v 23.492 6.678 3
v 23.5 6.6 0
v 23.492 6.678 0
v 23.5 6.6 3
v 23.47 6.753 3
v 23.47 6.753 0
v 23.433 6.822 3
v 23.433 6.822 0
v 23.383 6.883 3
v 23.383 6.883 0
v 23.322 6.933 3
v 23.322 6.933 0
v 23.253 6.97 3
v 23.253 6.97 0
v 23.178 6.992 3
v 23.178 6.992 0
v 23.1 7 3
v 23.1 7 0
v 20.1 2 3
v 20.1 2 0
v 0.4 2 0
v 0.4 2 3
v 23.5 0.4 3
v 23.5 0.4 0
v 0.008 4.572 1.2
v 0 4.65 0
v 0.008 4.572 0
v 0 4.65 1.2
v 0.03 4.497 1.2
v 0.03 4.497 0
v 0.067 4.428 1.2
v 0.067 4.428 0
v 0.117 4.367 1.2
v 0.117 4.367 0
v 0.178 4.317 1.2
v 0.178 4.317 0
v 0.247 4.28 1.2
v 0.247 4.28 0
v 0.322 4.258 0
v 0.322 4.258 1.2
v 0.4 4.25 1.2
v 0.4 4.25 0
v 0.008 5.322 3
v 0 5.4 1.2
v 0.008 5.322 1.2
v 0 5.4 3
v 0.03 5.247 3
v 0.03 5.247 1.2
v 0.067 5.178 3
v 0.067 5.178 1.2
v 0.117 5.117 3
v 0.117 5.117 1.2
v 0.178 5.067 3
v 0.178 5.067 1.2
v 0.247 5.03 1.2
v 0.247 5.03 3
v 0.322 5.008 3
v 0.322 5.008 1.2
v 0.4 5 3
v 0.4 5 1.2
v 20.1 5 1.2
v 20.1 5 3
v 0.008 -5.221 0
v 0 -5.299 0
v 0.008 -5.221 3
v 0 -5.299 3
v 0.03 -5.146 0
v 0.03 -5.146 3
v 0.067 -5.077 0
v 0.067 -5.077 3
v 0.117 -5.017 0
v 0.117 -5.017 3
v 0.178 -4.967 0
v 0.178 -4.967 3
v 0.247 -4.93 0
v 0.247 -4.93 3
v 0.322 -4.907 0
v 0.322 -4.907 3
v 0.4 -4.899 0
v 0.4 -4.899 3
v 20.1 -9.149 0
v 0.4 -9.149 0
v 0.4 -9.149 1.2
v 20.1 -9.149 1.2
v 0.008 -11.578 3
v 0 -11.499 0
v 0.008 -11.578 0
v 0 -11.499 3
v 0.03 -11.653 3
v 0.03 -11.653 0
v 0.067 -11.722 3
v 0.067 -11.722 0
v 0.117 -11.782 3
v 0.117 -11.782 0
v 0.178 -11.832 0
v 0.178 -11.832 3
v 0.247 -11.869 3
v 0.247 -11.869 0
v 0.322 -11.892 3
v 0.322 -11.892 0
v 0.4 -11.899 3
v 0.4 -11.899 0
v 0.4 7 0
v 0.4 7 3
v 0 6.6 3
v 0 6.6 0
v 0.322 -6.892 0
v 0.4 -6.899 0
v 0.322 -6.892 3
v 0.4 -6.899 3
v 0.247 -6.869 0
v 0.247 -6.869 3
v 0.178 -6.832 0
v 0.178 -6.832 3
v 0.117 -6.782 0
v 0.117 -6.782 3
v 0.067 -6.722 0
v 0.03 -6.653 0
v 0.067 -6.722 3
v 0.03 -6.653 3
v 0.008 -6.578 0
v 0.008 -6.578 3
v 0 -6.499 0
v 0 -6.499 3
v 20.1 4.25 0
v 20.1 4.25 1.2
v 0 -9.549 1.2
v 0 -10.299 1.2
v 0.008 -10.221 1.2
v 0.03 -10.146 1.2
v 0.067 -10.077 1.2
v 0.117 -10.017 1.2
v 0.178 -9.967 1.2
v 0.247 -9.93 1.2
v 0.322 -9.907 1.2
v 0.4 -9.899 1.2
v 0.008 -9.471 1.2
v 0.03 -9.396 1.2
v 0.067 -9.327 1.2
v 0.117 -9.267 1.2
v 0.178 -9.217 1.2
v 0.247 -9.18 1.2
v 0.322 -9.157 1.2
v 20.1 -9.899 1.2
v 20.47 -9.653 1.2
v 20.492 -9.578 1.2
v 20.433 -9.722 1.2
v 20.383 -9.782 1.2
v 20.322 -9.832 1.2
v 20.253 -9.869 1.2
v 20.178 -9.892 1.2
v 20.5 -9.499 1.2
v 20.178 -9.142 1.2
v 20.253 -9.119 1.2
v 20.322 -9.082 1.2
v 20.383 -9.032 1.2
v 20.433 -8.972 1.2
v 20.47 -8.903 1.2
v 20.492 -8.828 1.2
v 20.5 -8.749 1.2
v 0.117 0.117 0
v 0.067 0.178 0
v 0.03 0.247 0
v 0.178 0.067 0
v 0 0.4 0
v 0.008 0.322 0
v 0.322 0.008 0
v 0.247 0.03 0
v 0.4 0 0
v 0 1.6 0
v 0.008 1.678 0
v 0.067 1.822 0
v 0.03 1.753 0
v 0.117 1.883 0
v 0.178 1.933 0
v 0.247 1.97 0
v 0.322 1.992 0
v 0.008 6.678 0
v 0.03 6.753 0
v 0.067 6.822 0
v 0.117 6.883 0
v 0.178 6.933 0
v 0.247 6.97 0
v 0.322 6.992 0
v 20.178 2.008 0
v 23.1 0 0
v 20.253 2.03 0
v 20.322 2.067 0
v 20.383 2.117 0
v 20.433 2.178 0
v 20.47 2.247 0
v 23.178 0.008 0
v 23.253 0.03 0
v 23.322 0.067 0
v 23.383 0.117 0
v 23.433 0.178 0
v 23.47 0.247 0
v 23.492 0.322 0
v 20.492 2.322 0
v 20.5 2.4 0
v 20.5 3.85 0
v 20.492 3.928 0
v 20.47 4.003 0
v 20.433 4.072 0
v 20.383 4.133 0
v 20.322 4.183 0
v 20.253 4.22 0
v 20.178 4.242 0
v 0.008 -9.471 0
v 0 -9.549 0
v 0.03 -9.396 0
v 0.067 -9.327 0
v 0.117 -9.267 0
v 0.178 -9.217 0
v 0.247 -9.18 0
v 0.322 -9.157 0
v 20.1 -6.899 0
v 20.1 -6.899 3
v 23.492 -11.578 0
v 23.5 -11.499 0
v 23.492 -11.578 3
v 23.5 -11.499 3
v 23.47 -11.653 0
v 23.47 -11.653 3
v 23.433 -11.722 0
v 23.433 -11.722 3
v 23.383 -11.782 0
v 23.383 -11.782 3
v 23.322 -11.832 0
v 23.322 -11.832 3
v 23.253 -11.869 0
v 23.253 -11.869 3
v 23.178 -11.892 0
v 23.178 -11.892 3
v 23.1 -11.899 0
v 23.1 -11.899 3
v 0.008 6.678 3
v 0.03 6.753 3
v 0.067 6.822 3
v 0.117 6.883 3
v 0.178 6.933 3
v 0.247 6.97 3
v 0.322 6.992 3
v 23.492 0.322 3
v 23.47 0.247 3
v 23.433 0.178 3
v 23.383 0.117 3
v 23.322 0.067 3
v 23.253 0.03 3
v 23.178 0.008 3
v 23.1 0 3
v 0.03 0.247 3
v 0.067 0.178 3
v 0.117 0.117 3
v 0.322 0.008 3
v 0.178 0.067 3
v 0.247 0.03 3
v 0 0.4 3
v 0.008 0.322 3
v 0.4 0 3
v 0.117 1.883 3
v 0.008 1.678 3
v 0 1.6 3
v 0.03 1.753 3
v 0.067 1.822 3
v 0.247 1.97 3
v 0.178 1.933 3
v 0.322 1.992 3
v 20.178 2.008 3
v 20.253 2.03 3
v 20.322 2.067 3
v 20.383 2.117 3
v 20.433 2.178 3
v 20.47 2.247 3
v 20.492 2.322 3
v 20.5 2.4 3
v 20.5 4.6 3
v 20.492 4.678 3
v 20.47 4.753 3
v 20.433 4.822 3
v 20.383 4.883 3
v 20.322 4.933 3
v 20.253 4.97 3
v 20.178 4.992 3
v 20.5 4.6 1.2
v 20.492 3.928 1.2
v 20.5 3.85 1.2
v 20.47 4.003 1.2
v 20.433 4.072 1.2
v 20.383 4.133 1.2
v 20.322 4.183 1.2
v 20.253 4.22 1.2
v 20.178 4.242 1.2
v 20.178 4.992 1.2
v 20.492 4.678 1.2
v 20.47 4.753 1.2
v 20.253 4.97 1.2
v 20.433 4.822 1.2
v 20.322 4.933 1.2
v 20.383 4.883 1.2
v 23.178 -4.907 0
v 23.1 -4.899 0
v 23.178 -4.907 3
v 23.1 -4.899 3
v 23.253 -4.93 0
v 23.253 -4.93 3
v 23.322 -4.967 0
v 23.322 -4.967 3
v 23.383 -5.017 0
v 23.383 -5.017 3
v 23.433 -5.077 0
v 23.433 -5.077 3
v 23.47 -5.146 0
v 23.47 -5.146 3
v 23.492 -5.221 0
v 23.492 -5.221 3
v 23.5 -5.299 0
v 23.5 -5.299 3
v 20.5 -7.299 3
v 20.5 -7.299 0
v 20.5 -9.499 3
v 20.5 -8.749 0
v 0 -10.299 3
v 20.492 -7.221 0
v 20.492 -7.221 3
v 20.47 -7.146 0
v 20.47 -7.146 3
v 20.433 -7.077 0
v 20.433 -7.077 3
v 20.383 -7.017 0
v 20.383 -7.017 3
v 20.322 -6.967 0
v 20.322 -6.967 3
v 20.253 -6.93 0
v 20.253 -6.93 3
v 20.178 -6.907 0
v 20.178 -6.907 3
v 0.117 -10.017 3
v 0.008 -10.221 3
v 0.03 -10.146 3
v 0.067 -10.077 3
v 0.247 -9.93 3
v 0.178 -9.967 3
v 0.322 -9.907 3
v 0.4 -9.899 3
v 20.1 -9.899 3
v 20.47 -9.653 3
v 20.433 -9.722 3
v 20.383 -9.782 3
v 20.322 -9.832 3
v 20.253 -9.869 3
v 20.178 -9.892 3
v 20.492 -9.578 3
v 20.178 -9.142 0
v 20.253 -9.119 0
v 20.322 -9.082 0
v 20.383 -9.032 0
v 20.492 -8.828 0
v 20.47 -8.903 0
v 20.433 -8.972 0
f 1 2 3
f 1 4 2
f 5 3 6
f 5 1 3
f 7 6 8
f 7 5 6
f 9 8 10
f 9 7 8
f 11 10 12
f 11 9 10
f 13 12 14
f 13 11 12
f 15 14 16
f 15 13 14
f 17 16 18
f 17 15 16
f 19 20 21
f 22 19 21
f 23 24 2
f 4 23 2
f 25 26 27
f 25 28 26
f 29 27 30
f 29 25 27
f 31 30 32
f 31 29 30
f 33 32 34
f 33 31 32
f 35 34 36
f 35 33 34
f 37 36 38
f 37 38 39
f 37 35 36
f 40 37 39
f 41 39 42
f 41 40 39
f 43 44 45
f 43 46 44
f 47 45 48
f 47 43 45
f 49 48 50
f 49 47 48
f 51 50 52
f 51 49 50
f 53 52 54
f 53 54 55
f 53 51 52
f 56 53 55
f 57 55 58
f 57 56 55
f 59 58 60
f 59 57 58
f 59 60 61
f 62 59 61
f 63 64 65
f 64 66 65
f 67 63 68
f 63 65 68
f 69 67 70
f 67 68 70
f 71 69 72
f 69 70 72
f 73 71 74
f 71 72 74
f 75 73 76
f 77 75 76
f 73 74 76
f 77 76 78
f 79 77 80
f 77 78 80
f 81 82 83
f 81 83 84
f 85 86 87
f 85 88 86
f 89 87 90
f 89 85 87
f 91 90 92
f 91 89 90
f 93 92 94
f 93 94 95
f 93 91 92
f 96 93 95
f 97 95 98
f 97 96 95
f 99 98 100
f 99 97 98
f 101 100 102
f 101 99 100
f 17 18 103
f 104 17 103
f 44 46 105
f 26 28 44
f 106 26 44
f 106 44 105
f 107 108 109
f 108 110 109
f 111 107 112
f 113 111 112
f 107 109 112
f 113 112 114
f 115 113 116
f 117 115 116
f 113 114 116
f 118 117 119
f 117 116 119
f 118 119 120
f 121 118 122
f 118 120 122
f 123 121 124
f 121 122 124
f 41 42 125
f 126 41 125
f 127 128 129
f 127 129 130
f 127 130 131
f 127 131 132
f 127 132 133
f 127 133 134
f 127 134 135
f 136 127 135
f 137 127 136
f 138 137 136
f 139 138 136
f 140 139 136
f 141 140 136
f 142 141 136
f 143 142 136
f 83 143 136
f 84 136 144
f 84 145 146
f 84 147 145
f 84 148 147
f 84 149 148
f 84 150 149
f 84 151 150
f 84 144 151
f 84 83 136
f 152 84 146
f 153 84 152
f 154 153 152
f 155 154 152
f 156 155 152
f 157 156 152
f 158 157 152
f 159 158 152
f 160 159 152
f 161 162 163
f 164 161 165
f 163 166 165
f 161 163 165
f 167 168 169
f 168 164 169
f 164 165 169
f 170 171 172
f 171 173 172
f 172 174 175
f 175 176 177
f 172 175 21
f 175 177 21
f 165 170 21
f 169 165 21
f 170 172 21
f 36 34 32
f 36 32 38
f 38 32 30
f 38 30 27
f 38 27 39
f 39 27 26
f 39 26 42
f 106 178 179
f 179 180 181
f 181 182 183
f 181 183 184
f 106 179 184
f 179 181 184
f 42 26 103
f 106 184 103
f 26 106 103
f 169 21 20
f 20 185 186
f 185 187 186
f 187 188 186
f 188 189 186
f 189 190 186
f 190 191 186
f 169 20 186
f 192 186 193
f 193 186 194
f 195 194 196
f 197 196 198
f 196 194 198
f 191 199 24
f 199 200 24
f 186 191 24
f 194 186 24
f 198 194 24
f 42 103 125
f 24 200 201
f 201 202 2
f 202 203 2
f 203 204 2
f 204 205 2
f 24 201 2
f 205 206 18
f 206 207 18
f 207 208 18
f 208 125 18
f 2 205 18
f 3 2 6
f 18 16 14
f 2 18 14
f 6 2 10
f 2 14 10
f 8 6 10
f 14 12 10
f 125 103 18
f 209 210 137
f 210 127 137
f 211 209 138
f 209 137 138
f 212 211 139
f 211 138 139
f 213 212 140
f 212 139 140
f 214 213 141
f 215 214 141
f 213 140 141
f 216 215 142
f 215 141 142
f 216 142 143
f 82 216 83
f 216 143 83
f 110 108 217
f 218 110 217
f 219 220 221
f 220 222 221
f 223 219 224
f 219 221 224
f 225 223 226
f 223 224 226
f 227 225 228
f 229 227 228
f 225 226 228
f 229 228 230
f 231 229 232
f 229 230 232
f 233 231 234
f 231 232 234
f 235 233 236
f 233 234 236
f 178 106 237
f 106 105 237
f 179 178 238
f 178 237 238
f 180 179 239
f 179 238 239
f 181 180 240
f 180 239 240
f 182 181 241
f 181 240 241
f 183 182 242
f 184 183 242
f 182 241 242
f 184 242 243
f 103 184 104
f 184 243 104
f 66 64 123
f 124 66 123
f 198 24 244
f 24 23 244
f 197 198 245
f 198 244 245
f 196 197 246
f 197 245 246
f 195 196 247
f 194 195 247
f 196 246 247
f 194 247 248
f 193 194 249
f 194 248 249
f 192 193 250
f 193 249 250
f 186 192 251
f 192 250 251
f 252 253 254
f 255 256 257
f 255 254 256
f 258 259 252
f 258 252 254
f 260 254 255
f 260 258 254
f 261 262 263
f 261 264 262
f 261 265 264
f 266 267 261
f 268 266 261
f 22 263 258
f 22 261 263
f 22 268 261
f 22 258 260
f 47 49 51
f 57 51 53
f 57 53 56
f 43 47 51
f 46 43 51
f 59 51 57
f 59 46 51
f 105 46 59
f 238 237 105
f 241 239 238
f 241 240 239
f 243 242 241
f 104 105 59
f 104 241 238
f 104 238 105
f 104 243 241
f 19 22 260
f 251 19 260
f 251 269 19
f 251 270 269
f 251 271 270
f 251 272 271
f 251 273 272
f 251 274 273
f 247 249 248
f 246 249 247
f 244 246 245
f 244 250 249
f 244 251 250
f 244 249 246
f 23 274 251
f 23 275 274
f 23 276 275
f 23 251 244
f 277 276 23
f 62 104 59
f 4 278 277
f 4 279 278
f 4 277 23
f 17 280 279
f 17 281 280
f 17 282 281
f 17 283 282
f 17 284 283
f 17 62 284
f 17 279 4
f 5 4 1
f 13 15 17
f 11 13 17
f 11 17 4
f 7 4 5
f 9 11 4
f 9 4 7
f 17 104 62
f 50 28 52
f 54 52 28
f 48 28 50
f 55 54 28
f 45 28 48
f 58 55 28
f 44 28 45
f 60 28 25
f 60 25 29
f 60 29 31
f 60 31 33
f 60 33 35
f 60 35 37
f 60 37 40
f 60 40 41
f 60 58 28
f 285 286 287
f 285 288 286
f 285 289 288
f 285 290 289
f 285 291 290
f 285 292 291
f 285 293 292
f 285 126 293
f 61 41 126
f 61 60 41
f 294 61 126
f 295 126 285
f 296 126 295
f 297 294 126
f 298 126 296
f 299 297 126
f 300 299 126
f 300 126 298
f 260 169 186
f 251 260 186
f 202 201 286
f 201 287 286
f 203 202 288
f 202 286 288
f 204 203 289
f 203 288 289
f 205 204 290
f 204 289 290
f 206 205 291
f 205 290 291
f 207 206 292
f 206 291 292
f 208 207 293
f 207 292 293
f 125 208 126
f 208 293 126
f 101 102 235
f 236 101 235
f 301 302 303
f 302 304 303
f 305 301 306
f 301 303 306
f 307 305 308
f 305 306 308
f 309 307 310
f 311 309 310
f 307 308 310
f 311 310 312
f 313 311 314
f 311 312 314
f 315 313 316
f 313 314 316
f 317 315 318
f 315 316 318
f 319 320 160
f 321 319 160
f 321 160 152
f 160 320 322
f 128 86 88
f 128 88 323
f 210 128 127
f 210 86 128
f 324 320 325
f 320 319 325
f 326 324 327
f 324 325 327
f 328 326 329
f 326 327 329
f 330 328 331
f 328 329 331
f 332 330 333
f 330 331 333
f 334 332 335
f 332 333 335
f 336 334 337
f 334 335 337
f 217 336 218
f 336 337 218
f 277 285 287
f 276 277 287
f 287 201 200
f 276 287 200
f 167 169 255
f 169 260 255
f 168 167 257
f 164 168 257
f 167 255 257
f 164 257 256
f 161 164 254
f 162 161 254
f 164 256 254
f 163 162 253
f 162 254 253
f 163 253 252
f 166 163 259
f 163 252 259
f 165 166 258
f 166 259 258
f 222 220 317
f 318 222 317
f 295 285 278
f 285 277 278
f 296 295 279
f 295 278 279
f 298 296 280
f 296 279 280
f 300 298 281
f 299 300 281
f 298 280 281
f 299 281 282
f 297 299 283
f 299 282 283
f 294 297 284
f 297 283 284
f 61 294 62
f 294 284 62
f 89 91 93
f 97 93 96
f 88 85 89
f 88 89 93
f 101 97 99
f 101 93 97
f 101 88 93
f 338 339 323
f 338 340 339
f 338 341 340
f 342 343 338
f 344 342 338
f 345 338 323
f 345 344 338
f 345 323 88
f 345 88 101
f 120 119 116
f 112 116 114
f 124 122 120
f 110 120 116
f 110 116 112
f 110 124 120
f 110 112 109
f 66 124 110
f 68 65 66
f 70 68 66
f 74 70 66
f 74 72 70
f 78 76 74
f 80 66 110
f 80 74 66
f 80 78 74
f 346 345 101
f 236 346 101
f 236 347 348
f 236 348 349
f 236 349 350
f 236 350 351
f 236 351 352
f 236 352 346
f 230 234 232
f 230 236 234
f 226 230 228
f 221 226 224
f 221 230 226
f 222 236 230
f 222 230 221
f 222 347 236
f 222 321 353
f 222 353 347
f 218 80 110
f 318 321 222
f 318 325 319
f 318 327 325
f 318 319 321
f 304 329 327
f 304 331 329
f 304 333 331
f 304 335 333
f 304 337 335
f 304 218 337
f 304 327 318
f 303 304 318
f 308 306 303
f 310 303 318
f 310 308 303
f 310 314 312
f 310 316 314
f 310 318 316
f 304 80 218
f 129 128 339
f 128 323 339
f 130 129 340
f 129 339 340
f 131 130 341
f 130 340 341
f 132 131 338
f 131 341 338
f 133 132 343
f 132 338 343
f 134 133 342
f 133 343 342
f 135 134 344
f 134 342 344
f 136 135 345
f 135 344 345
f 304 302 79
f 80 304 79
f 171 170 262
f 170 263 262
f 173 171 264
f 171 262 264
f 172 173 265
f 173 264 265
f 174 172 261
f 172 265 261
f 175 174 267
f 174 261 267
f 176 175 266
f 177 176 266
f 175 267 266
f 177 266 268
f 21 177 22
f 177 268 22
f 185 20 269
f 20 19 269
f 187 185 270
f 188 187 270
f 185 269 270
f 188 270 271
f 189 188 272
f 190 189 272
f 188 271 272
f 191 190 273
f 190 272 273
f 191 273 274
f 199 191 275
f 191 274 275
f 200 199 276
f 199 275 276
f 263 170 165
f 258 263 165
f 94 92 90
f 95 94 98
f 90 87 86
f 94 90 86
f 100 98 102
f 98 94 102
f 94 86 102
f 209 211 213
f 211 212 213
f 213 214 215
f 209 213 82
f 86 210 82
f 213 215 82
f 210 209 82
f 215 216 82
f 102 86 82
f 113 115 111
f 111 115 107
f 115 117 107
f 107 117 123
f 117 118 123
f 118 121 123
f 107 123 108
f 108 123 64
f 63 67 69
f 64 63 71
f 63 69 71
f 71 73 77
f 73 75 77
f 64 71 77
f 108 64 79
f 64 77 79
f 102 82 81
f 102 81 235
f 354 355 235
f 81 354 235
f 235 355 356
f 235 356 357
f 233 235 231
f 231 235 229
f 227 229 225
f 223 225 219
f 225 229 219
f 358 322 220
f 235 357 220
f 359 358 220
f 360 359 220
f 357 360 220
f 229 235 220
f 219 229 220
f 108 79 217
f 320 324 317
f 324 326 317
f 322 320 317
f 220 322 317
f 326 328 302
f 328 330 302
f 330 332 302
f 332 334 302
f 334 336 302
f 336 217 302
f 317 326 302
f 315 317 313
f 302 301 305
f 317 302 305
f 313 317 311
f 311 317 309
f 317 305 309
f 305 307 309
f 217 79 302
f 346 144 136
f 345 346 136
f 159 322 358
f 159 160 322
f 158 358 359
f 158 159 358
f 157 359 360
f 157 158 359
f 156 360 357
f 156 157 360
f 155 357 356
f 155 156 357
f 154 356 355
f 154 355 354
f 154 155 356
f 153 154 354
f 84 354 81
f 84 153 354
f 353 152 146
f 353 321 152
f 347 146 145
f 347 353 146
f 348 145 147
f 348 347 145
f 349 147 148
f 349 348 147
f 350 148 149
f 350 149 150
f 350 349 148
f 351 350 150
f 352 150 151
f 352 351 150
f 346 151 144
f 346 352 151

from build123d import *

# Parameters (mm, degrees)
BOSS_EXTRUDE1_DEPTH   = 3
BOSS_EXTRUDE1_2_DEPTH = 3
SKETCH2_4_W           = 20.5
SKETCH2_4_H           = 0.75
BOSS_EXTRUDE3_DEPTH   = 1.2
FILLET2_R             = 0.4
FILLET3_R             = 0.4


with BuildPart() as part:
    # Sketch2 → Boss-Extrude1 (new body)
    with BuildSketch(Plane.XY):
        Polygon((0, 2), (0, 0), (23.5, 0), (23.5, 7), (0, 7), (0, 5), (20.5, 5), (20.5, 2), align=None)
    extrude(amount=BOSS_EXTRUDE1_DEPTH)



with BuildPart() as body_2:
    # Sketch2 → Boss-Extrude1 2 (new body)
    with BuildSketch(Plane.XY):
        Polygon((20.5, -6.899471306), (20.5, -9.899471306), (0, -9.899471306), (0, -11.899471306), (23.5, -11.899471306), (23.5, -4.899471306), (0, -4.899471306), (0, -6.899471306), align=None)
    extrude(amount=BOSS_EXTRUDE1_2_DEPTH)


with BuildPart() as part_1:
    add(part.part)

    add(body_2.part)  # Boss-Extrude3 merges body 2
    # Sketch2<4> → Boss-Extrude3 (add)
    with BuildSketch(Plane.XY):
        with Locations((10.25, 4.625)):
            Rectangle(SKETCH2_4_W, SKETCH2_4_H)
        with Locations((10.25, -9.524471306)):
            Rectangle(SKETCH2_4_W, SKETCH2_4_H)
    extrude(amount=BOSS_EXTRUDE3_DEPTH)

    # Fillet2
    fillet2_edges = [part_1.edges().sort_by_distance(p)[0] for p in [
        (0, 5, 2.1),
        (20.5, 2, 1.5),
        (20.5, 4.25, 0.6),
        (20.5, 5, 2.1),
        (23.5, 7, 1.5),
        (23.5, 0, 1.5),
        (0, 0, 1.5),
        (0, 2, 1.5),
        (0, 4.25, 0.6),
        (0, 7, 1.5),
    ]]
    fillet(fillet2_edges, radius=FILLET2_R)

    # Fillet3
    fillet3_edges = [part_1.edges().sort_by_distance(p)[0] for p in [
        (23.5, -11.899471306, 1.5),
        (23.5, -4.899471306, 1.5),
        (20.5, -6.899471306, 1.5),
        (20.5, -9.899471306, 2.1),
        (20.5, -9.149471306, 0.6),
        (0, -11.899471306, 1.5),
        (0, -9.899471306, 2.1),
        (0, -9.149471306, 0.6),
        (0, -4.899471306, 1.5),
        (0, -6.899471306, 1.5),
    ]]
    fillet(fillet3_edges, radius=FILLET3_R)


solid = part_1.part
